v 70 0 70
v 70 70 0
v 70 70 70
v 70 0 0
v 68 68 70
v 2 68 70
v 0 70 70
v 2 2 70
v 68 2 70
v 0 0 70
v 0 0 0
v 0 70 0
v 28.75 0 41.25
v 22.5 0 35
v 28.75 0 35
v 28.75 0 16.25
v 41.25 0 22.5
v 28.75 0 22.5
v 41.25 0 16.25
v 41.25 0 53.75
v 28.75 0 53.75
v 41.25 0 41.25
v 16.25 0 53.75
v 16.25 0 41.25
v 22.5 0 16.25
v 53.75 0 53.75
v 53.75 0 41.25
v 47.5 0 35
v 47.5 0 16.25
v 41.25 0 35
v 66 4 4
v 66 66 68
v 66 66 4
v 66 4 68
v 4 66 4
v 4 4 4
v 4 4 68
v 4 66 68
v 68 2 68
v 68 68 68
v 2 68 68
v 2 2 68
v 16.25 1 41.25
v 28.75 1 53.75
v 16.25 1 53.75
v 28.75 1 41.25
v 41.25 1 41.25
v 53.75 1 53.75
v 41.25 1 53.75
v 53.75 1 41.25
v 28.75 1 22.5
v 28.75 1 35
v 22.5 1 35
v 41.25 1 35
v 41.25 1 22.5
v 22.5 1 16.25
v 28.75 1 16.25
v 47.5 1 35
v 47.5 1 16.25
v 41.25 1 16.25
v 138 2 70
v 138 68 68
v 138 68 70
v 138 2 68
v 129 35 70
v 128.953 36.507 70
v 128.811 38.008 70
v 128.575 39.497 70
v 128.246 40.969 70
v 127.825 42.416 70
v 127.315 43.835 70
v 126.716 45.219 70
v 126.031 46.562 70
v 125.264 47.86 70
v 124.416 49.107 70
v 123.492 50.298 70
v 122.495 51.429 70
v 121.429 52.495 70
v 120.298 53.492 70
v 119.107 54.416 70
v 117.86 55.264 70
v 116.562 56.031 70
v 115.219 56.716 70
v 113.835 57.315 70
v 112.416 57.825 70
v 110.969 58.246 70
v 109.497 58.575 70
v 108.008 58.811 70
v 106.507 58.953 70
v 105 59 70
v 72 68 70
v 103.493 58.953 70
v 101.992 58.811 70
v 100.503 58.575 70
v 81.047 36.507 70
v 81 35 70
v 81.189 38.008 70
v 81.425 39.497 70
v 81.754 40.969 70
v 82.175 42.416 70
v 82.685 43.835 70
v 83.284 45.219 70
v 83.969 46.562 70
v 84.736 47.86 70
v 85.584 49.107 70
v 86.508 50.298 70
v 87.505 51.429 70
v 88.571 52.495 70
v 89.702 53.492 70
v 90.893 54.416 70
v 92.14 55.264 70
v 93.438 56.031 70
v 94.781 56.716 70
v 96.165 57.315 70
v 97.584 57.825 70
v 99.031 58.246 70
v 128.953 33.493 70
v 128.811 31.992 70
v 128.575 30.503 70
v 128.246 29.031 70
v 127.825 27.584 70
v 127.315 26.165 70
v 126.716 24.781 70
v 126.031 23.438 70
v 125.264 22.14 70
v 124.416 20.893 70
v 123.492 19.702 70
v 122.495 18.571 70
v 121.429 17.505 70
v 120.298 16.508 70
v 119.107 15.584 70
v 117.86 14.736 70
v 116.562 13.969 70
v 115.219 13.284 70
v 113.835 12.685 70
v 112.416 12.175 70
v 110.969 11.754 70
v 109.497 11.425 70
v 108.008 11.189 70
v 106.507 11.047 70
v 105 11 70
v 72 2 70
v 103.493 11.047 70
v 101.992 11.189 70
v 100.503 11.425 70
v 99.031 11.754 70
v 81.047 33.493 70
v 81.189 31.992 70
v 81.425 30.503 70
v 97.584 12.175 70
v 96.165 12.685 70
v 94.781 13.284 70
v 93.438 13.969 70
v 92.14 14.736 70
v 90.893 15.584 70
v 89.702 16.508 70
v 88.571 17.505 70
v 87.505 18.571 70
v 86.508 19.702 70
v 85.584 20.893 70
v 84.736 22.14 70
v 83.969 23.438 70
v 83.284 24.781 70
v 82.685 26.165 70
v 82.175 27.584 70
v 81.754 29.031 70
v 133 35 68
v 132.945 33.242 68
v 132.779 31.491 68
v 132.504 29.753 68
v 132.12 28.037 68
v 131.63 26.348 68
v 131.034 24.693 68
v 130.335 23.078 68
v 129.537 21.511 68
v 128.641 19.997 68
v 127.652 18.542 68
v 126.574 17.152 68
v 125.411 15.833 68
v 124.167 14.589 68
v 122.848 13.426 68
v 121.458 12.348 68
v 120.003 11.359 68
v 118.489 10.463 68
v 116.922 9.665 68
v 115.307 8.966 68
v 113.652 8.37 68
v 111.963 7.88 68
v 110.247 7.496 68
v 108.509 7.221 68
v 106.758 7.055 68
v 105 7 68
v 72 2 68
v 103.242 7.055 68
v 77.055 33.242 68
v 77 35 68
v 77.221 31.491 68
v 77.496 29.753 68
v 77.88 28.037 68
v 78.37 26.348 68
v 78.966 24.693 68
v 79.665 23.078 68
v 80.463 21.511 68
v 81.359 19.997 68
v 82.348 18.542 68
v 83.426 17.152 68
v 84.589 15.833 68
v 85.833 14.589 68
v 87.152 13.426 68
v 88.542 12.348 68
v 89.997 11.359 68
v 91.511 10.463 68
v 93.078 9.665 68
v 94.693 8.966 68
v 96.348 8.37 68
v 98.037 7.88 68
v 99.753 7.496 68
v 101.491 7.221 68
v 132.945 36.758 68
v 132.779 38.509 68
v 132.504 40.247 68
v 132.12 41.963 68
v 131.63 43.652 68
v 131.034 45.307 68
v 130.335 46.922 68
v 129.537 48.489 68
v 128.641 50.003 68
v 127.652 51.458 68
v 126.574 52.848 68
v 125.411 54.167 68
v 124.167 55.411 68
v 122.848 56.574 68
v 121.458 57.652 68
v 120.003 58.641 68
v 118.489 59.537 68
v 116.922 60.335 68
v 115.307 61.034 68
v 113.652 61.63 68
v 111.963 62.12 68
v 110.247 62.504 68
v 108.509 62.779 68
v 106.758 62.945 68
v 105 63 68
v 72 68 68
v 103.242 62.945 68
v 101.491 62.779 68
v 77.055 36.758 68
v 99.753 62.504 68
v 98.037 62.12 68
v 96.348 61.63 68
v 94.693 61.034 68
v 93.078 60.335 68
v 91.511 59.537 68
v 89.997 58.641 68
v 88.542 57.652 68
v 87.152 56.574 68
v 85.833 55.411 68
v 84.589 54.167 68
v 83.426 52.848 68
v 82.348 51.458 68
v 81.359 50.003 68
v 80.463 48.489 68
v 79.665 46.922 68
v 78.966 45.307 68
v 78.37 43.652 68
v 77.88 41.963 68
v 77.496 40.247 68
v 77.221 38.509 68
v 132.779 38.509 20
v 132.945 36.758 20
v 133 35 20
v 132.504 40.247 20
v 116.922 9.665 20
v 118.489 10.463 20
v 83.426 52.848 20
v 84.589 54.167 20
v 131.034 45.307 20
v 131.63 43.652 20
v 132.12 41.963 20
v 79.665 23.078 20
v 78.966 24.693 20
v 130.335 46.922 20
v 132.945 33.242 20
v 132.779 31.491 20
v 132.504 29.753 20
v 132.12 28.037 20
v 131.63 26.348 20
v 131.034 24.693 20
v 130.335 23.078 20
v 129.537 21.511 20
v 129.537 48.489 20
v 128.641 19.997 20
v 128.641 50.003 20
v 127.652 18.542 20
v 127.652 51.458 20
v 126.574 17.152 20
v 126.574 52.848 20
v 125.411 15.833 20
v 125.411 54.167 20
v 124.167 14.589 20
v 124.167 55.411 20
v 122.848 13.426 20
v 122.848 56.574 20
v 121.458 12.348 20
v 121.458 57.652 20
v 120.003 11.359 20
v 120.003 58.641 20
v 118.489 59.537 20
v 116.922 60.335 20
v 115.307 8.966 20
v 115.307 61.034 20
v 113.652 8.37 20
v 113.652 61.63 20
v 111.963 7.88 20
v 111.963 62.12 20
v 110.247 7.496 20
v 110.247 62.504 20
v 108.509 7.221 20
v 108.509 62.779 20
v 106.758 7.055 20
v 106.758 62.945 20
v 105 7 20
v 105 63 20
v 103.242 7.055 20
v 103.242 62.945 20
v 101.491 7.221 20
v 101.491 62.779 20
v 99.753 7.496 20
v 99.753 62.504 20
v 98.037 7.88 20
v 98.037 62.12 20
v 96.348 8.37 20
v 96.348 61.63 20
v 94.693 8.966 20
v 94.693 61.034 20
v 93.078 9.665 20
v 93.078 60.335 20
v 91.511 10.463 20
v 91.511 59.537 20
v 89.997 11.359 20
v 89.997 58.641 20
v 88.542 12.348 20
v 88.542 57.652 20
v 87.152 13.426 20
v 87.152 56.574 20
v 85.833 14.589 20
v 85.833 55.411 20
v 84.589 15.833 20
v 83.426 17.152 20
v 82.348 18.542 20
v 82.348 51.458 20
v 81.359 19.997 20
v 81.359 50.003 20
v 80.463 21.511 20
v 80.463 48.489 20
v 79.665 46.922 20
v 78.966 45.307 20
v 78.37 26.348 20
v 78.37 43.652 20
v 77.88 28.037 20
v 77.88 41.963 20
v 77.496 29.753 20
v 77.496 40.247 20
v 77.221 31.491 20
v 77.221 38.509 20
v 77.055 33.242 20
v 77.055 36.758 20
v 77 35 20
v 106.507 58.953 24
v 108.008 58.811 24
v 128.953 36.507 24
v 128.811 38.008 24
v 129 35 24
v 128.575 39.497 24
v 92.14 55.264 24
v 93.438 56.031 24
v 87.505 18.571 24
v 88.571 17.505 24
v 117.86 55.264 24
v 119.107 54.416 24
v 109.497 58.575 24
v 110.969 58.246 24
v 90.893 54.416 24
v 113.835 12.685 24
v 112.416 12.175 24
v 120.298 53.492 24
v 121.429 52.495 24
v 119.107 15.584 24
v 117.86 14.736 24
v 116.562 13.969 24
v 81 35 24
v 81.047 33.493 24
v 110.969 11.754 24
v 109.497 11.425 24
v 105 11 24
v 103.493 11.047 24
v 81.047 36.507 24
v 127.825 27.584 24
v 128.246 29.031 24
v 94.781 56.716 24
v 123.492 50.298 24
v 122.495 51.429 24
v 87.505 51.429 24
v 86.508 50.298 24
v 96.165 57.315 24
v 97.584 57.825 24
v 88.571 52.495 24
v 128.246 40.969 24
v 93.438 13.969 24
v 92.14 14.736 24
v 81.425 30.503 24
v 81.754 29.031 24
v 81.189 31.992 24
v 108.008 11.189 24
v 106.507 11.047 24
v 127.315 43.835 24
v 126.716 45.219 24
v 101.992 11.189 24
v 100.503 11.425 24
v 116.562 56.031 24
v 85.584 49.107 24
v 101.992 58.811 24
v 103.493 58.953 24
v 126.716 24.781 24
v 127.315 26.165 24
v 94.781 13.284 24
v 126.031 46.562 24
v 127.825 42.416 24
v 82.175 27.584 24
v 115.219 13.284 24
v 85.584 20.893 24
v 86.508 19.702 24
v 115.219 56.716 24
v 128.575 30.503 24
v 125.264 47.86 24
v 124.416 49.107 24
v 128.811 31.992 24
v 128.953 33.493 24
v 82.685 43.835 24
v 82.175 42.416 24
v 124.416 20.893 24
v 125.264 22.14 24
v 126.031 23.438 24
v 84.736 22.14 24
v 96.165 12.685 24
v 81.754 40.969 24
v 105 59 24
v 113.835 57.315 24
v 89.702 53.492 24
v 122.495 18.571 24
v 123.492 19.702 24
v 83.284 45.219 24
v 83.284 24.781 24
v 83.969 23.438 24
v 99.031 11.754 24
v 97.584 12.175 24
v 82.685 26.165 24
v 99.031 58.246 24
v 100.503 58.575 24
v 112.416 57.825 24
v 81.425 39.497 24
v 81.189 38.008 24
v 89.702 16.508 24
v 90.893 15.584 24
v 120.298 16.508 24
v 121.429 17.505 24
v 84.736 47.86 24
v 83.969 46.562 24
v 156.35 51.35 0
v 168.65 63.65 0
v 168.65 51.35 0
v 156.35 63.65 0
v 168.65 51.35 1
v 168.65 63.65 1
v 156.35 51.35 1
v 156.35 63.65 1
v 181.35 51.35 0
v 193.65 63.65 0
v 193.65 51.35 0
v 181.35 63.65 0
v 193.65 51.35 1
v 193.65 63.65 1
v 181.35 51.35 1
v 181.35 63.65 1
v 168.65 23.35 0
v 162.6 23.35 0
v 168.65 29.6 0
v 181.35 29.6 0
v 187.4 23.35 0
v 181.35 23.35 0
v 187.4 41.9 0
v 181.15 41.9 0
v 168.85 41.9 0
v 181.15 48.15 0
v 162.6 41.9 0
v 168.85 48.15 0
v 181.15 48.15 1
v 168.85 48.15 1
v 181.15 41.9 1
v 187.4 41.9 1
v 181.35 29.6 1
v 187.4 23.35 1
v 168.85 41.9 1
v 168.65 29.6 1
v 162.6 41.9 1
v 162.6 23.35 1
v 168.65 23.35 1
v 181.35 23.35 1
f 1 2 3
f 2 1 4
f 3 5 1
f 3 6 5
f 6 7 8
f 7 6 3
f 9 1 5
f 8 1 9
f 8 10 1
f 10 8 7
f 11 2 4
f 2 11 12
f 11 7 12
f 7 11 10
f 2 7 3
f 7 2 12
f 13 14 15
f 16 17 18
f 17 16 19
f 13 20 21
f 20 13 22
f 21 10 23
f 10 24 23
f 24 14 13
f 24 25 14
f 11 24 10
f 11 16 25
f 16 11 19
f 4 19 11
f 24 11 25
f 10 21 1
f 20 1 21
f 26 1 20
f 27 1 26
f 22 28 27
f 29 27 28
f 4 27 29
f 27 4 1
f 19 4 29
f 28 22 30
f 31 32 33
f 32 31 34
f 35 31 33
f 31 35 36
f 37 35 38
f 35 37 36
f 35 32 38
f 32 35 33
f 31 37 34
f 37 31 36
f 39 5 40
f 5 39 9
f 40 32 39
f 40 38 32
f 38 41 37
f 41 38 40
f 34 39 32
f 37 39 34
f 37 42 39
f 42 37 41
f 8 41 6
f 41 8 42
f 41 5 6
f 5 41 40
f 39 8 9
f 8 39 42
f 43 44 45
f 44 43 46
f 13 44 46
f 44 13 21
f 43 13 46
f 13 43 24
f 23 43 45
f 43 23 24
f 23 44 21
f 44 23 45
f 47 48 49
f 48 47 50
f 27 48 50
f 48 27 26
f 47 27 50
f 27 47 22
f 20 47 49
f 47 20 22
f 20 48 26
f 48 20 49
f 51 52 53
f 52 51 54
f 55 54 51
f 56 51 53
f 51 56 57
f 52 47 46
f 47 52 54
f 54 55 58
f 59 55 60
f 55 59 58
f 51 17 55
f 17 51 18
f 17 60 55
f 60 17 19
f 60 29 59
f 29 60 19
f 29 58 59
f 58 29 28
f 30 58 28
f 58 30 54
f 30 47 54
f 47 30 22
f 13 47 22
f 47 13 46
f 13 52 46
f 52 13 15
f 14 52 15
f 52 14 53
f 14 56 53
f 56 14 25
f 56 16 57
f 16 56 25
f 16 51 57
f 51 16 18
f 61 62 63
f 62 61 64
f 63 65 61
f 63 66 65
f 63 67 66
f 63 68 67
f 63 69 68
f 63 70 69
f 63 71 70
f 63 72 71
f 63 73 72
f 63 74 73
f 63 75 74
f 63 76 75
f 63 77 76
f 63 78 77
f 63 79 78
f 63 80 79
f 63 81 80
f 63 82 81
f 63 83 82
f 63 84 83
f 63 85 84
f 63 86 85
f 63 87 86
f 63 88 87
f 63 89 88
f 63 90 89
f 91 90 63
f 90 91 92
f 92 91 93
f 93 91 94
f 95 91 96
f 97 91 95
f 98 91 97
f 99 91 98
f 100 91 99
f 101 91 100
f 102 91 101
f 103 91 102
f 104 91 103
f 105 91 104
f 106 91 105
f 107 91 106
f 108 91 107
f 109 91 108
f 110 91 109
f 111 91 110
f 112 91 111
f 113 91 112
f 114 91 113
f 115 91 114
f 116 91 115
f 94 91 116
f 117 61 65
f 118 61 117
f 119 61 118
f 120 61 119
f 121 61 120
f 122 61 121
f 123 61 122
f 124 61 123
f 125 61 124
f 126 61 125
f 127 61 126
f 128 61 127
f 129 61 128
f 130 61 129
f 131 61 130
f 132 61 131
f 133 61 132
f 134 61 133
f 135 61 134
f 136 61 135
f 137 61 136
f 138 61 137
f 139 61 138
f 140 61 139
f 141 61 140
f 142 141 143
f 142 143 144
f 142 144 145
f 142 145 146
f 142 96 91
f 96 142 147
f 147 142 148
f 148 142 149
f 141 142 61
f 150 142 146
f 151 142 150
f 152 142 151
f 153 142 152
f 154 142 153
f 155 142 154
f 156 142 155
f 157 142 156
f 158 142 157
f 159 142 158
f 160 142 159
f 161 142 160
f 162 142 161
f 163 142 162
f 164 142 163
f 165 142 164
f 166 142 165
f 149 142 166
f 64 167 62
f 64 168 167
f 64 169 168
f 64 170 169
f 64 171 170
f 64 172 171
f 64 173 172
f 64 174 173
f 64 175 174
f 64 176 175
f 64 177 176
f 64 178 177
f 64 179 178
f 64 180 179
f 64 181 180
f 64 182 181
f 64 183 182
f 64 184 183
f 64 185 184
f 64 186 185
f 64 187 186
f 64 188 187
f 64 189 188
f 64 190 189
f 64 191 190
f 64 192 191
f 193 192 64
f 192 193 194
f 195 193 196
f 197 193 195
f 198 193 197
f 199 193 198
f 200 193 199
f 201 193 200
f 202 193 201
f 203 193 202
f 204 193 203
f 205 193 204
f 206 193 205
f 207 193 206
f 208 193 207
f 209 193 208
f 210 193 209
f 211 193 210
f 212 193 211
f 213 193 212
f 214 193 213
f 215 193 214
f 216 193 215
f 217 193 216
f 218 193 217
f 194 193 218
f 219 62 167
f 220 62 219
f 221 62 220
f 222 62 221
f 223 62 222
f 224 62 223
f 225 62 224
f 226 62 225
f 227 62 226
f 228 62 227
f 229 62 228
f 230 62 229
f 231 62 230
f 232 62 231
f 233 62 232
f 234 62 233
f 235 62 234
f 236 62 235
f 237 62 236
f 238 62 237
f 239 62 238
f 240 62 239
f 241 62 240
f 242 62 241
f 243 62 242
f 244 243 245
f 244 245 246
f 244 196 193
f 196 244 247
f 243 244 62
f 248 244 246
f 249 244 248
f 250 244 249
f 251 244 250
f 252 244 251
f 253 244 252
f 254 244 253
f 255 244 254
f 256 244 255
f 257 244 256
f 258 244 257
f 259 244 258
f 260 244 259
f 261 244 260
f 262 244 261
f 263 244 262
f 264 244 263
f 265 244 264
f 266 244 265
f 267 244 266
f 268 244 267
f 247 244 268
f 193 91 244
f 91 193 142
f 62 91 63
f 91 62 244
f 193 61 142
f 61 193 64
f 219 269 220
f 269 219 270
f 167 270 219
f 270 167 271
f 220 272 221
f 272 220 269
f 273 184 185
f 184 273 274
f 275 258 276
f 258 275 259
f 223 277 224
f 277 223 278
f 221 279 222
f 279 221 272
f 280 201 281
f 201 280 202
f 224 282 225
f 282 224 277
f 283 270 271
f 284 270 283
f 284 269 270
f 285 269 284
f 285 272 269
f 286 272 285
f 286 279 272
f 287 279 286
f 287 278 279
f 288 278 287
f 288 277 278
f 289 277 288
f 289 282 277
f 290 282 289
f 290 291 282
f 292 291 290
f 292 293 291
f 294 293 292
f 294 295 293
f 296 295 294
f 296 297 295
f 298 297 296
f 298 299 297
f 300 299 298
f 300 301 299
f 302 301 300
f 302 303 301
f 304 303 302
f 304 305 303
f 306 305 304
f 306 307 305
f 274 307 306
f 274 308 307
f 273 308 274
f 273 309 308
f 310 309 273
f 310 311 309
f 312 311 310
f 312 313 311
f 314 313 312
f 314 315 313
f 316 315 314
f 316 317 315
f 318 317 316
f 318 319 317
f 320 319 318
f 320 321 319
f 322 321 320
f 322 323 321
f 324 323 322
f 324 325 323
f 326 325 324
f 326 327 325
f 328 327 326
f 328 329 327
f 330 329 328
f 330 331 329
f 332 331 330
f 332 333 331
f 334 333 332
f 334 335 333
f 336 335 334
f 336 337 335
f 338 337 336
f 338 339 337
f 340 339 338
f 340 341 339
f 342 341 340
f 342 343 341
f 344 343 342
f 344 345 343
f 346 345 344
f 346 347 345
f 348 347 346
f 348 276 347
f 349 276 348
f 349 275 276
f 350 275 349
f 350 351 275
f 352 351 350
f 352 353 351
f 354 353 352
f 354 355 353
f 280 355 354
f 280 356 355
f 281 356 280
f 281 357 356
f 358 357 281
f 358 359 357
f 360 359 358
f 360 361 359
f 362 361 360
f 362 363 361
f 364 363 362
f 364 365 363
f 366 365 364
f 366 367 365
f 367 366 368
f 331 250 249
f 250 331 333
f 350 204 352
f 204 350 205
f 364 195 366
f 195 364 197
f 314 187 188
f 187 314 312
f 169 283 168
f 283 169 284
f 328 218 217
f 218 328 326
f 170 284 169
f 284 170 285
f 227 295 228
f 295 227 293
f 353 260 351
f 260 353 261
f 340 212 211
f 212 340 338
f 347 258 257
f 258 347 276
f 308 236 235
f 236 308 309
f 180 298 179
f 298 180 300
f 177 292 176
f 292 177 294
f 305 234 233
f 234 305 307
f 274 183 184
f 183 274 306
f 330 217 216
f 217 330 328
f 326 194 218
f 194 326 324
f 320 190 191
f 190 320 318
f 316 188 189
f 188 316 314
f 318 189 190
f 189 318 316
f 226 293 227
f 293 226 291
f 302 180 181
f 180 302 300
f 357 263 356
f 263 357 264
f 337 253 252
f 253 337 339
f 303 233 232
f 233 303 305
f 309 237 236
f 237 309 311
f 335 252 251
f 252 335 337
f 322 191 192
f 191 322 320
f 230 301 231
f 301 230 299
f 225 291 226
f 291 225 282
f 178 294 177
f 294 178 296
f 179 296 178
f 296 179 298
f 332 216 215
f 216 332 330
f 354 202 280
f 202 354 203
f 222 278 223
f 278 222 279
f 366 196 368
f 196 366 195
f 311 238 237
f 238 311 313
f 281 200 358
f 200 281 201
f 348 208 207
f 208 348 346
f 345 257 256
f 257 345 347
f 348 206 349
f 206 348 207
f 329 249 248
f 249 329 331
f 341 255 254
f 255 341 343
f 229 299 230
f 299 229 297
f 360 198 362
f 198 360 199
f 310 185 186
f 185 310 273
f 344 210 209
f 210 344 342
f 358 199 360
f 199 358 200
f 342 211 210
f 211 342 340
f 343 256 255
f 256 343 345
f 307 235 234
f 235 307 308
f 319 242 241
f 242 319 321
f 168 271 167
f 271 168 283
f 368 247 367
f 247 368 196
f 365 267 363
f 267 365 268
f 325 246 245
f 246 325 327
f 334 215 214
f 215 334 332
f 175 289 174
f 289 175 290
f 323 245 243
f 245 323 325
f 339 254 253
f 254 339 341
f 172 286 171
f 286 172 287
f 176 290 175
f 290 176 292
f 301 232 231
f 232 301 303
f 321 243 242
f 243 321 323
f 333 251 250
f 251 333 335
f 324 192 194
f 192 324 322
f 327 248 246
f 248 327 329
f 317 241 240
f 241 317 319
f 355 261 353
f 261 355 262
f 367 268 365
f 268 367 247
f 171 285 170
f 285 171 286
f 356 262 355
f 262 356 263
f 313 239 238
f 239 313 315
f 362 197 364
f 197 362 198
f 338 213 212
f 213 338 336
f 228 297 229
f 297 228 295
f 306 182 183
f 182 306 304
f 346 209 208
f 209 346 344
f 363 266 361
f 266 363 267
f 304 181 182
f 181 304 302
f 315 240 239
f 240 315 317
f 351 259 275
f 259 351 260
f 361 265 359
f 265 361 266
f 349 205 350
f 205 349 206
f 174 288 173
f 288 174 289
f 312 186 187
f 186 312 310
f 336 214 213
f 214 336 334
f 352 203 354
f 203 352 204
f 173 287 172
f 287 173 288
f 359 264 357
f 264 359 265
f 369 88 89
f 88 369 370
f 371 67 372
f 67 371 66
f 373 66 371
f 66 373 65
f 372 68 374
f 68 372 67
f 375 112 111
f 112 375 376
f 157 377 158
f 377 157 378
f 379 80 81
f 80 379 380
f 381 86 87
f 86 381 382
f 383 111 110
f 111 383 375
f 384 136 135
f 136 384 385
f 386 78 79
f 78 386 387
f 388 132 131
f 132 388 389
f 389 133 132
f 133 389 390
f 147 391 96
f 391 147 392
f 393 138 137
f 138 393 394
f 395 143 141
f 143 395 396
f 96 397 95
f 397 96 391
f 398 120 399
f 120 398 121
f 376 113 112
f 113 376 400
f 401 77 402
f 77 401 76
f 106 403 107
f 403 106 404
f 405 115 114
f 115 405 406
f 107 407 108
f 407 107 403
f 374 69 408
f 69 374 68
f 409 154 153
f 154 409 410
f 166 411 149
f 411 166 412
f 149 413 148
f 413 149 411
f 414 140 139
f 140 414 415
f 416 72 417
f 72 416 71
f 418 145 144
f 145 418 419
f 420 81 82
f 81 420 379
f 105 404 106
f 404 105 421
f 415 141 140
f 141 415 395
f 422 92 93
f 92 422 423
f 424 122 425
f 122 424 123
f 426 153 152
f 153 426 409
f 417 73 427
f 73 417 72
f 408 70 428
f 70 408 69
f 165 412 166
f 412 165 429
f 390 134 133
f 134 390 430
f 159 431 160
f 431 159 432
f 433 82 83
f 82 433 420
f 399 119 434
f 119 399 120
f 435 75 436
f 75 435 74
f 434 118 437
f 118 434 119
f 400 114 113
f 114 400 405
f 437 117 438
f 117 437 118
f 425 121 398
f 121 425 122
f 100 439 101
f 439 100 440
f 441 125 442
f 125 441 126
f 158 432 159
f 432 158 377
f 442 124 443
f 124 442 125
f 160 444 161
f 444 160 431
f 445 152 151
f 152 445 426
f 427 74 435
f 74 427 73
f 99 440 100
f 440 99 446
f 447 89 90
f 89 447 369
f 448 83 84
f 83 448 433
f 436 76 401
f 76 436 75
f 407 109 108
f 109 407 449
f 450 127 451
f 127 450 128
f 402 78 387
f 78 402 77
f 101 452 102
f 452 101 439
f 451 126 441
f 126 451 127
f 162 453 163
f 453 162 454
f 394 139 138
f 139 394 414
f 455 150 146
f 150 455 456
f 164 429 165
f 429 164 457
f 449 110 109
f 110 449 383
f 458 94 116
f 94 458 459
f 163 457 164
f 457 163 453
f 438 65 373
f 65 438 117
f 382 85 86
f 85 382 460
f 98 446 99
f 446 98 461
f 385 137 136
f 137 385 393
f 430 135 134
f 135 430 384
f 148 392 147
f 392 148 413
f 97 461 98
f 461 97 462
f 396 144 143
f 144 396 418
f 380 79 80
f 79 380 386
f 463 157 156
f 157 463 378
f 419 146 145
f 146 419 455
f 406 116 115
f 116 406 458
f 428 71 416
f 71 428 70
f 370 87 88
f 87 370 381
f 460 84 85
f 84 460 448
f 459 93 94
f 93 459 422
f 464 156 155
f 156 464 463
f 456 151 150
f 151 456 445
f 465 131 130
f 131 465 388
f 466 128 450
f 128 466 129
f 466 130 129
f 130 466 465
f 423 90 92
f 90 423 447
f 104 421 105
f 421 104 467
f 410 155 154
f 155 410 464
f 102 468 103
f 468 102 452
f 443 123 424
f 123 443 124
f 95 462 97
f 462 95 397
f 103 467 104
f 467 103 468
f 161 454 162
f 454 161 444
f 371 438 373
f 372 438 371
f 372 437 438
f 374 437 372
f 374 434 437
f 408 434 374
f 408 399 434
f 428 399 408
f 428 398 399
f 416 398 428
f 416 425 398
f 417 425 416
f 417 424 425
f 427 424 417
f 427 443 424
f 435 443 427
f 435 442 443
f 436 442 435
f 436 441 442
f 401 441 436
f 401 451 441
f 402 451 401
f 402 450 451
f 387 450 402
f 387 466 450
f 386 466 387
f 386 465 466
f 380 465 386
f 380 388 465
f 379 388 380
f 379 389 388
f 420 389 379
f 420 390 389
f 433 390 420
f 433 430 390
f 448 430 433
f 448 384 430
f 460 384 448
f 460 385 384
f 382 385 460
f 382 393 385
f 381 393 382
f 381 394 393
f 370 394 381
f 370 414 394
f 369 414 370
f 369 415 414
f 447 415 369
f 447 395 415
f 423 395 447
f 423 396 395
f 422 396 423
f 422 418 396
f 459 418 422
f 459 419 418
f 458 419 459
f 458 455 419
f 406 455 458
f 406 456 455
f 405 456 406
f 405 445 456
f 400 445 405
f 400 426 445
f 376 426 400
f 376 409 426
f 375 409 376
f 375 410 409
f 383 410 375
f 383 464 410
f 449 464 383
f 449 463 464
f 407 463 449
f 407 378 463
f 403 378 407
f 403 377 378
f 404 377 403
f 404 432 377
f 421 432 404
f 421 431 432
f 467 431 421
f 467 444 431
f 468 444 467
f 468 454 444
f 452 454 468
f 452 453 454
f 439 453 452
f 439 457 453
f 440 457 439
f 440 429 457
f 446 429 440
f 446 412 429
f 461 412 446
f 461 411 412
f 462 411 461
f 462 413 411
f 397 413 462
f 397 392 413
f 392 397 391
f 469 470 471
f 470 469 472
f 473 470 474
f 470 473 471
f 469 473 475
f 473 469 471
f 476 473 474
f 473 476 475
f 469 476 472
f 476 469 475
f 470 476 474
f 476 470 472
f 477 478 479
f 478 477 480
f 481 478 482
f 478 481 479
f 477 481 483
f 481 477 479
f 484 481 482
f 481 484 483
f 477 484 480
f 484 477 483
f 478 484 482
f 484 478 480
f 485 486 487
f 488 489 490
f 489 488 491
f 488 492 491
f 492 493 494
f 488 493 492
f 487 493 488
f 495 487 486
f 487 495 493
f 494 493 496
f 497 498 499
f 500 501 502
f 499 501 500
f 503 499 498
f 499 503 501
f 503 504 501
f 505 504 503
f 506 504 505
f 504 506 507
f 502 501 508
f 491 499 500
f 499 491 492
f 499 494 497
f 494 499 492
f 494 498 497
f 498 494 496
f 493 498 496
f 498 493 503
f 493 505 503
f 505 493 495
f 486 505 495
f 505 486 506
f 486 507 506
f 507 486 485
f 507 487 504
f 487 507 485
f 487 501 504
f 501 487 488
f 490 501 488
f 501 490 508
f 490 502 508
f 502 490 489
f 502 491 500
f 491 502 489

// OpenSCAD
// ! make root
// % transparent
// * hide
// # mark

// translate([20, 20, 20]) {}
// difference() {}

//
$fn = 100;

cube_size = 70;
outer_edge_radius = 2.5;
inner_radius = 35;
padding = 10;
lid_height = 2;
lid_overlap = 2;
wall_width = 4;
insert_radius = 28;
insert_height = 50;
face_tolerance = 0.1;

function pot_pocket_width() = cube_size - 2 * wall_width;
function pot_pochet_height() = cube_size - wall_width;
function lid_z() = cube_size - lid_height;
function lid_width() = cube_size - 2 * lid_overlap;
function face_depth() = 1;
function face_sub_edge() = (cube_size - 2 * padding) / 8;

// FACE
eye_l_grid = [[1, 5], [3, 5], [3, 7], [1, 7]];
eye_r_grid = [[5, 5], [7, 5], [7, 7], [5, 7]];
nose_grid  = [[2, 1], [3, 1], [3, 2], [5, 2], [5, 1], [6, 1],
              [6, 4], [5, 4], [5, 5], [3, 5], [3, 4], [2, 4]];

function face_pts(grid) =
    [for (p = grid) [padding + face_sub_edge() * p[0], padding + face_sub_edge() * p[1]]];

// Each piece is extruded separately and joined only in 3D. A 2D linear_extrude on a region 
// that narrows down to a point produces an open mesh — a 3D union does not have this issue, 
// so corners of eyes and nose can meet exactly.
//   grow - size adjustment; opening is practically 1:1, insert is smaller by face_tolerance
//   gap  - nose offset when laying out pieces on the build plate
module face_solid(h, grow = 0, gap = 0) {
    linear_extrude(height = h) offset(delta = grow) polygon(face_pts(eye_l_grid));
    linear_extrude(height = h) offset(delta = grow) polygon(face_pts(eye_r_grid));
    translate([0, -gap, 0])
        linear_extrude(height = h) offset(delta = grow) polygon(face_pts(nose_grid));
}

// POT
union() {
    color("green")
    difference() {
        difference() {
            difference() {
                cube(cube_size);
                translate([wall_width, wall_width, wall_width])
                    cube([pot_pocket_width(), pot_pocket_width(), pot_pochet_height()]);
            }
            translate([lid_overlap, lid_overlap, lid_z()])
                cube([lid_width(), lid_width(), lid_height]);
            
        }
        
        translate([0, face_depth(), 0])
            rotate([90, 0, 0])
                face_solid(face_depth() + 0.1, grow = 0);
    }
}


// LID
color("green")
translate([lid_overlap + cube_size, lid_overlap, lid_z()]) {
    difference() {
        union() {
            cube([lid_width(), lid_width(), lid_height]);
            translate([lid_width() / 2, lid_width() / 2, -insert_height + lid_height])
                cylinder(insert_height, insert_radius, insert_radius);
        }
        translate([lid_width() / 2, lid_width() / 2, -insert_height + lid_height + wall_width])
            cylinder(insert_height - wall_width, insert_radius - wall_width, insert_radius - wall_width);
    }
}

// FACE
face_print_gap = 3;

color("black")
translate([cube_size * 2, 10, 0])
    face_solid(face_depth(), grow = -face_tolerance, gap = face_print_gap);
